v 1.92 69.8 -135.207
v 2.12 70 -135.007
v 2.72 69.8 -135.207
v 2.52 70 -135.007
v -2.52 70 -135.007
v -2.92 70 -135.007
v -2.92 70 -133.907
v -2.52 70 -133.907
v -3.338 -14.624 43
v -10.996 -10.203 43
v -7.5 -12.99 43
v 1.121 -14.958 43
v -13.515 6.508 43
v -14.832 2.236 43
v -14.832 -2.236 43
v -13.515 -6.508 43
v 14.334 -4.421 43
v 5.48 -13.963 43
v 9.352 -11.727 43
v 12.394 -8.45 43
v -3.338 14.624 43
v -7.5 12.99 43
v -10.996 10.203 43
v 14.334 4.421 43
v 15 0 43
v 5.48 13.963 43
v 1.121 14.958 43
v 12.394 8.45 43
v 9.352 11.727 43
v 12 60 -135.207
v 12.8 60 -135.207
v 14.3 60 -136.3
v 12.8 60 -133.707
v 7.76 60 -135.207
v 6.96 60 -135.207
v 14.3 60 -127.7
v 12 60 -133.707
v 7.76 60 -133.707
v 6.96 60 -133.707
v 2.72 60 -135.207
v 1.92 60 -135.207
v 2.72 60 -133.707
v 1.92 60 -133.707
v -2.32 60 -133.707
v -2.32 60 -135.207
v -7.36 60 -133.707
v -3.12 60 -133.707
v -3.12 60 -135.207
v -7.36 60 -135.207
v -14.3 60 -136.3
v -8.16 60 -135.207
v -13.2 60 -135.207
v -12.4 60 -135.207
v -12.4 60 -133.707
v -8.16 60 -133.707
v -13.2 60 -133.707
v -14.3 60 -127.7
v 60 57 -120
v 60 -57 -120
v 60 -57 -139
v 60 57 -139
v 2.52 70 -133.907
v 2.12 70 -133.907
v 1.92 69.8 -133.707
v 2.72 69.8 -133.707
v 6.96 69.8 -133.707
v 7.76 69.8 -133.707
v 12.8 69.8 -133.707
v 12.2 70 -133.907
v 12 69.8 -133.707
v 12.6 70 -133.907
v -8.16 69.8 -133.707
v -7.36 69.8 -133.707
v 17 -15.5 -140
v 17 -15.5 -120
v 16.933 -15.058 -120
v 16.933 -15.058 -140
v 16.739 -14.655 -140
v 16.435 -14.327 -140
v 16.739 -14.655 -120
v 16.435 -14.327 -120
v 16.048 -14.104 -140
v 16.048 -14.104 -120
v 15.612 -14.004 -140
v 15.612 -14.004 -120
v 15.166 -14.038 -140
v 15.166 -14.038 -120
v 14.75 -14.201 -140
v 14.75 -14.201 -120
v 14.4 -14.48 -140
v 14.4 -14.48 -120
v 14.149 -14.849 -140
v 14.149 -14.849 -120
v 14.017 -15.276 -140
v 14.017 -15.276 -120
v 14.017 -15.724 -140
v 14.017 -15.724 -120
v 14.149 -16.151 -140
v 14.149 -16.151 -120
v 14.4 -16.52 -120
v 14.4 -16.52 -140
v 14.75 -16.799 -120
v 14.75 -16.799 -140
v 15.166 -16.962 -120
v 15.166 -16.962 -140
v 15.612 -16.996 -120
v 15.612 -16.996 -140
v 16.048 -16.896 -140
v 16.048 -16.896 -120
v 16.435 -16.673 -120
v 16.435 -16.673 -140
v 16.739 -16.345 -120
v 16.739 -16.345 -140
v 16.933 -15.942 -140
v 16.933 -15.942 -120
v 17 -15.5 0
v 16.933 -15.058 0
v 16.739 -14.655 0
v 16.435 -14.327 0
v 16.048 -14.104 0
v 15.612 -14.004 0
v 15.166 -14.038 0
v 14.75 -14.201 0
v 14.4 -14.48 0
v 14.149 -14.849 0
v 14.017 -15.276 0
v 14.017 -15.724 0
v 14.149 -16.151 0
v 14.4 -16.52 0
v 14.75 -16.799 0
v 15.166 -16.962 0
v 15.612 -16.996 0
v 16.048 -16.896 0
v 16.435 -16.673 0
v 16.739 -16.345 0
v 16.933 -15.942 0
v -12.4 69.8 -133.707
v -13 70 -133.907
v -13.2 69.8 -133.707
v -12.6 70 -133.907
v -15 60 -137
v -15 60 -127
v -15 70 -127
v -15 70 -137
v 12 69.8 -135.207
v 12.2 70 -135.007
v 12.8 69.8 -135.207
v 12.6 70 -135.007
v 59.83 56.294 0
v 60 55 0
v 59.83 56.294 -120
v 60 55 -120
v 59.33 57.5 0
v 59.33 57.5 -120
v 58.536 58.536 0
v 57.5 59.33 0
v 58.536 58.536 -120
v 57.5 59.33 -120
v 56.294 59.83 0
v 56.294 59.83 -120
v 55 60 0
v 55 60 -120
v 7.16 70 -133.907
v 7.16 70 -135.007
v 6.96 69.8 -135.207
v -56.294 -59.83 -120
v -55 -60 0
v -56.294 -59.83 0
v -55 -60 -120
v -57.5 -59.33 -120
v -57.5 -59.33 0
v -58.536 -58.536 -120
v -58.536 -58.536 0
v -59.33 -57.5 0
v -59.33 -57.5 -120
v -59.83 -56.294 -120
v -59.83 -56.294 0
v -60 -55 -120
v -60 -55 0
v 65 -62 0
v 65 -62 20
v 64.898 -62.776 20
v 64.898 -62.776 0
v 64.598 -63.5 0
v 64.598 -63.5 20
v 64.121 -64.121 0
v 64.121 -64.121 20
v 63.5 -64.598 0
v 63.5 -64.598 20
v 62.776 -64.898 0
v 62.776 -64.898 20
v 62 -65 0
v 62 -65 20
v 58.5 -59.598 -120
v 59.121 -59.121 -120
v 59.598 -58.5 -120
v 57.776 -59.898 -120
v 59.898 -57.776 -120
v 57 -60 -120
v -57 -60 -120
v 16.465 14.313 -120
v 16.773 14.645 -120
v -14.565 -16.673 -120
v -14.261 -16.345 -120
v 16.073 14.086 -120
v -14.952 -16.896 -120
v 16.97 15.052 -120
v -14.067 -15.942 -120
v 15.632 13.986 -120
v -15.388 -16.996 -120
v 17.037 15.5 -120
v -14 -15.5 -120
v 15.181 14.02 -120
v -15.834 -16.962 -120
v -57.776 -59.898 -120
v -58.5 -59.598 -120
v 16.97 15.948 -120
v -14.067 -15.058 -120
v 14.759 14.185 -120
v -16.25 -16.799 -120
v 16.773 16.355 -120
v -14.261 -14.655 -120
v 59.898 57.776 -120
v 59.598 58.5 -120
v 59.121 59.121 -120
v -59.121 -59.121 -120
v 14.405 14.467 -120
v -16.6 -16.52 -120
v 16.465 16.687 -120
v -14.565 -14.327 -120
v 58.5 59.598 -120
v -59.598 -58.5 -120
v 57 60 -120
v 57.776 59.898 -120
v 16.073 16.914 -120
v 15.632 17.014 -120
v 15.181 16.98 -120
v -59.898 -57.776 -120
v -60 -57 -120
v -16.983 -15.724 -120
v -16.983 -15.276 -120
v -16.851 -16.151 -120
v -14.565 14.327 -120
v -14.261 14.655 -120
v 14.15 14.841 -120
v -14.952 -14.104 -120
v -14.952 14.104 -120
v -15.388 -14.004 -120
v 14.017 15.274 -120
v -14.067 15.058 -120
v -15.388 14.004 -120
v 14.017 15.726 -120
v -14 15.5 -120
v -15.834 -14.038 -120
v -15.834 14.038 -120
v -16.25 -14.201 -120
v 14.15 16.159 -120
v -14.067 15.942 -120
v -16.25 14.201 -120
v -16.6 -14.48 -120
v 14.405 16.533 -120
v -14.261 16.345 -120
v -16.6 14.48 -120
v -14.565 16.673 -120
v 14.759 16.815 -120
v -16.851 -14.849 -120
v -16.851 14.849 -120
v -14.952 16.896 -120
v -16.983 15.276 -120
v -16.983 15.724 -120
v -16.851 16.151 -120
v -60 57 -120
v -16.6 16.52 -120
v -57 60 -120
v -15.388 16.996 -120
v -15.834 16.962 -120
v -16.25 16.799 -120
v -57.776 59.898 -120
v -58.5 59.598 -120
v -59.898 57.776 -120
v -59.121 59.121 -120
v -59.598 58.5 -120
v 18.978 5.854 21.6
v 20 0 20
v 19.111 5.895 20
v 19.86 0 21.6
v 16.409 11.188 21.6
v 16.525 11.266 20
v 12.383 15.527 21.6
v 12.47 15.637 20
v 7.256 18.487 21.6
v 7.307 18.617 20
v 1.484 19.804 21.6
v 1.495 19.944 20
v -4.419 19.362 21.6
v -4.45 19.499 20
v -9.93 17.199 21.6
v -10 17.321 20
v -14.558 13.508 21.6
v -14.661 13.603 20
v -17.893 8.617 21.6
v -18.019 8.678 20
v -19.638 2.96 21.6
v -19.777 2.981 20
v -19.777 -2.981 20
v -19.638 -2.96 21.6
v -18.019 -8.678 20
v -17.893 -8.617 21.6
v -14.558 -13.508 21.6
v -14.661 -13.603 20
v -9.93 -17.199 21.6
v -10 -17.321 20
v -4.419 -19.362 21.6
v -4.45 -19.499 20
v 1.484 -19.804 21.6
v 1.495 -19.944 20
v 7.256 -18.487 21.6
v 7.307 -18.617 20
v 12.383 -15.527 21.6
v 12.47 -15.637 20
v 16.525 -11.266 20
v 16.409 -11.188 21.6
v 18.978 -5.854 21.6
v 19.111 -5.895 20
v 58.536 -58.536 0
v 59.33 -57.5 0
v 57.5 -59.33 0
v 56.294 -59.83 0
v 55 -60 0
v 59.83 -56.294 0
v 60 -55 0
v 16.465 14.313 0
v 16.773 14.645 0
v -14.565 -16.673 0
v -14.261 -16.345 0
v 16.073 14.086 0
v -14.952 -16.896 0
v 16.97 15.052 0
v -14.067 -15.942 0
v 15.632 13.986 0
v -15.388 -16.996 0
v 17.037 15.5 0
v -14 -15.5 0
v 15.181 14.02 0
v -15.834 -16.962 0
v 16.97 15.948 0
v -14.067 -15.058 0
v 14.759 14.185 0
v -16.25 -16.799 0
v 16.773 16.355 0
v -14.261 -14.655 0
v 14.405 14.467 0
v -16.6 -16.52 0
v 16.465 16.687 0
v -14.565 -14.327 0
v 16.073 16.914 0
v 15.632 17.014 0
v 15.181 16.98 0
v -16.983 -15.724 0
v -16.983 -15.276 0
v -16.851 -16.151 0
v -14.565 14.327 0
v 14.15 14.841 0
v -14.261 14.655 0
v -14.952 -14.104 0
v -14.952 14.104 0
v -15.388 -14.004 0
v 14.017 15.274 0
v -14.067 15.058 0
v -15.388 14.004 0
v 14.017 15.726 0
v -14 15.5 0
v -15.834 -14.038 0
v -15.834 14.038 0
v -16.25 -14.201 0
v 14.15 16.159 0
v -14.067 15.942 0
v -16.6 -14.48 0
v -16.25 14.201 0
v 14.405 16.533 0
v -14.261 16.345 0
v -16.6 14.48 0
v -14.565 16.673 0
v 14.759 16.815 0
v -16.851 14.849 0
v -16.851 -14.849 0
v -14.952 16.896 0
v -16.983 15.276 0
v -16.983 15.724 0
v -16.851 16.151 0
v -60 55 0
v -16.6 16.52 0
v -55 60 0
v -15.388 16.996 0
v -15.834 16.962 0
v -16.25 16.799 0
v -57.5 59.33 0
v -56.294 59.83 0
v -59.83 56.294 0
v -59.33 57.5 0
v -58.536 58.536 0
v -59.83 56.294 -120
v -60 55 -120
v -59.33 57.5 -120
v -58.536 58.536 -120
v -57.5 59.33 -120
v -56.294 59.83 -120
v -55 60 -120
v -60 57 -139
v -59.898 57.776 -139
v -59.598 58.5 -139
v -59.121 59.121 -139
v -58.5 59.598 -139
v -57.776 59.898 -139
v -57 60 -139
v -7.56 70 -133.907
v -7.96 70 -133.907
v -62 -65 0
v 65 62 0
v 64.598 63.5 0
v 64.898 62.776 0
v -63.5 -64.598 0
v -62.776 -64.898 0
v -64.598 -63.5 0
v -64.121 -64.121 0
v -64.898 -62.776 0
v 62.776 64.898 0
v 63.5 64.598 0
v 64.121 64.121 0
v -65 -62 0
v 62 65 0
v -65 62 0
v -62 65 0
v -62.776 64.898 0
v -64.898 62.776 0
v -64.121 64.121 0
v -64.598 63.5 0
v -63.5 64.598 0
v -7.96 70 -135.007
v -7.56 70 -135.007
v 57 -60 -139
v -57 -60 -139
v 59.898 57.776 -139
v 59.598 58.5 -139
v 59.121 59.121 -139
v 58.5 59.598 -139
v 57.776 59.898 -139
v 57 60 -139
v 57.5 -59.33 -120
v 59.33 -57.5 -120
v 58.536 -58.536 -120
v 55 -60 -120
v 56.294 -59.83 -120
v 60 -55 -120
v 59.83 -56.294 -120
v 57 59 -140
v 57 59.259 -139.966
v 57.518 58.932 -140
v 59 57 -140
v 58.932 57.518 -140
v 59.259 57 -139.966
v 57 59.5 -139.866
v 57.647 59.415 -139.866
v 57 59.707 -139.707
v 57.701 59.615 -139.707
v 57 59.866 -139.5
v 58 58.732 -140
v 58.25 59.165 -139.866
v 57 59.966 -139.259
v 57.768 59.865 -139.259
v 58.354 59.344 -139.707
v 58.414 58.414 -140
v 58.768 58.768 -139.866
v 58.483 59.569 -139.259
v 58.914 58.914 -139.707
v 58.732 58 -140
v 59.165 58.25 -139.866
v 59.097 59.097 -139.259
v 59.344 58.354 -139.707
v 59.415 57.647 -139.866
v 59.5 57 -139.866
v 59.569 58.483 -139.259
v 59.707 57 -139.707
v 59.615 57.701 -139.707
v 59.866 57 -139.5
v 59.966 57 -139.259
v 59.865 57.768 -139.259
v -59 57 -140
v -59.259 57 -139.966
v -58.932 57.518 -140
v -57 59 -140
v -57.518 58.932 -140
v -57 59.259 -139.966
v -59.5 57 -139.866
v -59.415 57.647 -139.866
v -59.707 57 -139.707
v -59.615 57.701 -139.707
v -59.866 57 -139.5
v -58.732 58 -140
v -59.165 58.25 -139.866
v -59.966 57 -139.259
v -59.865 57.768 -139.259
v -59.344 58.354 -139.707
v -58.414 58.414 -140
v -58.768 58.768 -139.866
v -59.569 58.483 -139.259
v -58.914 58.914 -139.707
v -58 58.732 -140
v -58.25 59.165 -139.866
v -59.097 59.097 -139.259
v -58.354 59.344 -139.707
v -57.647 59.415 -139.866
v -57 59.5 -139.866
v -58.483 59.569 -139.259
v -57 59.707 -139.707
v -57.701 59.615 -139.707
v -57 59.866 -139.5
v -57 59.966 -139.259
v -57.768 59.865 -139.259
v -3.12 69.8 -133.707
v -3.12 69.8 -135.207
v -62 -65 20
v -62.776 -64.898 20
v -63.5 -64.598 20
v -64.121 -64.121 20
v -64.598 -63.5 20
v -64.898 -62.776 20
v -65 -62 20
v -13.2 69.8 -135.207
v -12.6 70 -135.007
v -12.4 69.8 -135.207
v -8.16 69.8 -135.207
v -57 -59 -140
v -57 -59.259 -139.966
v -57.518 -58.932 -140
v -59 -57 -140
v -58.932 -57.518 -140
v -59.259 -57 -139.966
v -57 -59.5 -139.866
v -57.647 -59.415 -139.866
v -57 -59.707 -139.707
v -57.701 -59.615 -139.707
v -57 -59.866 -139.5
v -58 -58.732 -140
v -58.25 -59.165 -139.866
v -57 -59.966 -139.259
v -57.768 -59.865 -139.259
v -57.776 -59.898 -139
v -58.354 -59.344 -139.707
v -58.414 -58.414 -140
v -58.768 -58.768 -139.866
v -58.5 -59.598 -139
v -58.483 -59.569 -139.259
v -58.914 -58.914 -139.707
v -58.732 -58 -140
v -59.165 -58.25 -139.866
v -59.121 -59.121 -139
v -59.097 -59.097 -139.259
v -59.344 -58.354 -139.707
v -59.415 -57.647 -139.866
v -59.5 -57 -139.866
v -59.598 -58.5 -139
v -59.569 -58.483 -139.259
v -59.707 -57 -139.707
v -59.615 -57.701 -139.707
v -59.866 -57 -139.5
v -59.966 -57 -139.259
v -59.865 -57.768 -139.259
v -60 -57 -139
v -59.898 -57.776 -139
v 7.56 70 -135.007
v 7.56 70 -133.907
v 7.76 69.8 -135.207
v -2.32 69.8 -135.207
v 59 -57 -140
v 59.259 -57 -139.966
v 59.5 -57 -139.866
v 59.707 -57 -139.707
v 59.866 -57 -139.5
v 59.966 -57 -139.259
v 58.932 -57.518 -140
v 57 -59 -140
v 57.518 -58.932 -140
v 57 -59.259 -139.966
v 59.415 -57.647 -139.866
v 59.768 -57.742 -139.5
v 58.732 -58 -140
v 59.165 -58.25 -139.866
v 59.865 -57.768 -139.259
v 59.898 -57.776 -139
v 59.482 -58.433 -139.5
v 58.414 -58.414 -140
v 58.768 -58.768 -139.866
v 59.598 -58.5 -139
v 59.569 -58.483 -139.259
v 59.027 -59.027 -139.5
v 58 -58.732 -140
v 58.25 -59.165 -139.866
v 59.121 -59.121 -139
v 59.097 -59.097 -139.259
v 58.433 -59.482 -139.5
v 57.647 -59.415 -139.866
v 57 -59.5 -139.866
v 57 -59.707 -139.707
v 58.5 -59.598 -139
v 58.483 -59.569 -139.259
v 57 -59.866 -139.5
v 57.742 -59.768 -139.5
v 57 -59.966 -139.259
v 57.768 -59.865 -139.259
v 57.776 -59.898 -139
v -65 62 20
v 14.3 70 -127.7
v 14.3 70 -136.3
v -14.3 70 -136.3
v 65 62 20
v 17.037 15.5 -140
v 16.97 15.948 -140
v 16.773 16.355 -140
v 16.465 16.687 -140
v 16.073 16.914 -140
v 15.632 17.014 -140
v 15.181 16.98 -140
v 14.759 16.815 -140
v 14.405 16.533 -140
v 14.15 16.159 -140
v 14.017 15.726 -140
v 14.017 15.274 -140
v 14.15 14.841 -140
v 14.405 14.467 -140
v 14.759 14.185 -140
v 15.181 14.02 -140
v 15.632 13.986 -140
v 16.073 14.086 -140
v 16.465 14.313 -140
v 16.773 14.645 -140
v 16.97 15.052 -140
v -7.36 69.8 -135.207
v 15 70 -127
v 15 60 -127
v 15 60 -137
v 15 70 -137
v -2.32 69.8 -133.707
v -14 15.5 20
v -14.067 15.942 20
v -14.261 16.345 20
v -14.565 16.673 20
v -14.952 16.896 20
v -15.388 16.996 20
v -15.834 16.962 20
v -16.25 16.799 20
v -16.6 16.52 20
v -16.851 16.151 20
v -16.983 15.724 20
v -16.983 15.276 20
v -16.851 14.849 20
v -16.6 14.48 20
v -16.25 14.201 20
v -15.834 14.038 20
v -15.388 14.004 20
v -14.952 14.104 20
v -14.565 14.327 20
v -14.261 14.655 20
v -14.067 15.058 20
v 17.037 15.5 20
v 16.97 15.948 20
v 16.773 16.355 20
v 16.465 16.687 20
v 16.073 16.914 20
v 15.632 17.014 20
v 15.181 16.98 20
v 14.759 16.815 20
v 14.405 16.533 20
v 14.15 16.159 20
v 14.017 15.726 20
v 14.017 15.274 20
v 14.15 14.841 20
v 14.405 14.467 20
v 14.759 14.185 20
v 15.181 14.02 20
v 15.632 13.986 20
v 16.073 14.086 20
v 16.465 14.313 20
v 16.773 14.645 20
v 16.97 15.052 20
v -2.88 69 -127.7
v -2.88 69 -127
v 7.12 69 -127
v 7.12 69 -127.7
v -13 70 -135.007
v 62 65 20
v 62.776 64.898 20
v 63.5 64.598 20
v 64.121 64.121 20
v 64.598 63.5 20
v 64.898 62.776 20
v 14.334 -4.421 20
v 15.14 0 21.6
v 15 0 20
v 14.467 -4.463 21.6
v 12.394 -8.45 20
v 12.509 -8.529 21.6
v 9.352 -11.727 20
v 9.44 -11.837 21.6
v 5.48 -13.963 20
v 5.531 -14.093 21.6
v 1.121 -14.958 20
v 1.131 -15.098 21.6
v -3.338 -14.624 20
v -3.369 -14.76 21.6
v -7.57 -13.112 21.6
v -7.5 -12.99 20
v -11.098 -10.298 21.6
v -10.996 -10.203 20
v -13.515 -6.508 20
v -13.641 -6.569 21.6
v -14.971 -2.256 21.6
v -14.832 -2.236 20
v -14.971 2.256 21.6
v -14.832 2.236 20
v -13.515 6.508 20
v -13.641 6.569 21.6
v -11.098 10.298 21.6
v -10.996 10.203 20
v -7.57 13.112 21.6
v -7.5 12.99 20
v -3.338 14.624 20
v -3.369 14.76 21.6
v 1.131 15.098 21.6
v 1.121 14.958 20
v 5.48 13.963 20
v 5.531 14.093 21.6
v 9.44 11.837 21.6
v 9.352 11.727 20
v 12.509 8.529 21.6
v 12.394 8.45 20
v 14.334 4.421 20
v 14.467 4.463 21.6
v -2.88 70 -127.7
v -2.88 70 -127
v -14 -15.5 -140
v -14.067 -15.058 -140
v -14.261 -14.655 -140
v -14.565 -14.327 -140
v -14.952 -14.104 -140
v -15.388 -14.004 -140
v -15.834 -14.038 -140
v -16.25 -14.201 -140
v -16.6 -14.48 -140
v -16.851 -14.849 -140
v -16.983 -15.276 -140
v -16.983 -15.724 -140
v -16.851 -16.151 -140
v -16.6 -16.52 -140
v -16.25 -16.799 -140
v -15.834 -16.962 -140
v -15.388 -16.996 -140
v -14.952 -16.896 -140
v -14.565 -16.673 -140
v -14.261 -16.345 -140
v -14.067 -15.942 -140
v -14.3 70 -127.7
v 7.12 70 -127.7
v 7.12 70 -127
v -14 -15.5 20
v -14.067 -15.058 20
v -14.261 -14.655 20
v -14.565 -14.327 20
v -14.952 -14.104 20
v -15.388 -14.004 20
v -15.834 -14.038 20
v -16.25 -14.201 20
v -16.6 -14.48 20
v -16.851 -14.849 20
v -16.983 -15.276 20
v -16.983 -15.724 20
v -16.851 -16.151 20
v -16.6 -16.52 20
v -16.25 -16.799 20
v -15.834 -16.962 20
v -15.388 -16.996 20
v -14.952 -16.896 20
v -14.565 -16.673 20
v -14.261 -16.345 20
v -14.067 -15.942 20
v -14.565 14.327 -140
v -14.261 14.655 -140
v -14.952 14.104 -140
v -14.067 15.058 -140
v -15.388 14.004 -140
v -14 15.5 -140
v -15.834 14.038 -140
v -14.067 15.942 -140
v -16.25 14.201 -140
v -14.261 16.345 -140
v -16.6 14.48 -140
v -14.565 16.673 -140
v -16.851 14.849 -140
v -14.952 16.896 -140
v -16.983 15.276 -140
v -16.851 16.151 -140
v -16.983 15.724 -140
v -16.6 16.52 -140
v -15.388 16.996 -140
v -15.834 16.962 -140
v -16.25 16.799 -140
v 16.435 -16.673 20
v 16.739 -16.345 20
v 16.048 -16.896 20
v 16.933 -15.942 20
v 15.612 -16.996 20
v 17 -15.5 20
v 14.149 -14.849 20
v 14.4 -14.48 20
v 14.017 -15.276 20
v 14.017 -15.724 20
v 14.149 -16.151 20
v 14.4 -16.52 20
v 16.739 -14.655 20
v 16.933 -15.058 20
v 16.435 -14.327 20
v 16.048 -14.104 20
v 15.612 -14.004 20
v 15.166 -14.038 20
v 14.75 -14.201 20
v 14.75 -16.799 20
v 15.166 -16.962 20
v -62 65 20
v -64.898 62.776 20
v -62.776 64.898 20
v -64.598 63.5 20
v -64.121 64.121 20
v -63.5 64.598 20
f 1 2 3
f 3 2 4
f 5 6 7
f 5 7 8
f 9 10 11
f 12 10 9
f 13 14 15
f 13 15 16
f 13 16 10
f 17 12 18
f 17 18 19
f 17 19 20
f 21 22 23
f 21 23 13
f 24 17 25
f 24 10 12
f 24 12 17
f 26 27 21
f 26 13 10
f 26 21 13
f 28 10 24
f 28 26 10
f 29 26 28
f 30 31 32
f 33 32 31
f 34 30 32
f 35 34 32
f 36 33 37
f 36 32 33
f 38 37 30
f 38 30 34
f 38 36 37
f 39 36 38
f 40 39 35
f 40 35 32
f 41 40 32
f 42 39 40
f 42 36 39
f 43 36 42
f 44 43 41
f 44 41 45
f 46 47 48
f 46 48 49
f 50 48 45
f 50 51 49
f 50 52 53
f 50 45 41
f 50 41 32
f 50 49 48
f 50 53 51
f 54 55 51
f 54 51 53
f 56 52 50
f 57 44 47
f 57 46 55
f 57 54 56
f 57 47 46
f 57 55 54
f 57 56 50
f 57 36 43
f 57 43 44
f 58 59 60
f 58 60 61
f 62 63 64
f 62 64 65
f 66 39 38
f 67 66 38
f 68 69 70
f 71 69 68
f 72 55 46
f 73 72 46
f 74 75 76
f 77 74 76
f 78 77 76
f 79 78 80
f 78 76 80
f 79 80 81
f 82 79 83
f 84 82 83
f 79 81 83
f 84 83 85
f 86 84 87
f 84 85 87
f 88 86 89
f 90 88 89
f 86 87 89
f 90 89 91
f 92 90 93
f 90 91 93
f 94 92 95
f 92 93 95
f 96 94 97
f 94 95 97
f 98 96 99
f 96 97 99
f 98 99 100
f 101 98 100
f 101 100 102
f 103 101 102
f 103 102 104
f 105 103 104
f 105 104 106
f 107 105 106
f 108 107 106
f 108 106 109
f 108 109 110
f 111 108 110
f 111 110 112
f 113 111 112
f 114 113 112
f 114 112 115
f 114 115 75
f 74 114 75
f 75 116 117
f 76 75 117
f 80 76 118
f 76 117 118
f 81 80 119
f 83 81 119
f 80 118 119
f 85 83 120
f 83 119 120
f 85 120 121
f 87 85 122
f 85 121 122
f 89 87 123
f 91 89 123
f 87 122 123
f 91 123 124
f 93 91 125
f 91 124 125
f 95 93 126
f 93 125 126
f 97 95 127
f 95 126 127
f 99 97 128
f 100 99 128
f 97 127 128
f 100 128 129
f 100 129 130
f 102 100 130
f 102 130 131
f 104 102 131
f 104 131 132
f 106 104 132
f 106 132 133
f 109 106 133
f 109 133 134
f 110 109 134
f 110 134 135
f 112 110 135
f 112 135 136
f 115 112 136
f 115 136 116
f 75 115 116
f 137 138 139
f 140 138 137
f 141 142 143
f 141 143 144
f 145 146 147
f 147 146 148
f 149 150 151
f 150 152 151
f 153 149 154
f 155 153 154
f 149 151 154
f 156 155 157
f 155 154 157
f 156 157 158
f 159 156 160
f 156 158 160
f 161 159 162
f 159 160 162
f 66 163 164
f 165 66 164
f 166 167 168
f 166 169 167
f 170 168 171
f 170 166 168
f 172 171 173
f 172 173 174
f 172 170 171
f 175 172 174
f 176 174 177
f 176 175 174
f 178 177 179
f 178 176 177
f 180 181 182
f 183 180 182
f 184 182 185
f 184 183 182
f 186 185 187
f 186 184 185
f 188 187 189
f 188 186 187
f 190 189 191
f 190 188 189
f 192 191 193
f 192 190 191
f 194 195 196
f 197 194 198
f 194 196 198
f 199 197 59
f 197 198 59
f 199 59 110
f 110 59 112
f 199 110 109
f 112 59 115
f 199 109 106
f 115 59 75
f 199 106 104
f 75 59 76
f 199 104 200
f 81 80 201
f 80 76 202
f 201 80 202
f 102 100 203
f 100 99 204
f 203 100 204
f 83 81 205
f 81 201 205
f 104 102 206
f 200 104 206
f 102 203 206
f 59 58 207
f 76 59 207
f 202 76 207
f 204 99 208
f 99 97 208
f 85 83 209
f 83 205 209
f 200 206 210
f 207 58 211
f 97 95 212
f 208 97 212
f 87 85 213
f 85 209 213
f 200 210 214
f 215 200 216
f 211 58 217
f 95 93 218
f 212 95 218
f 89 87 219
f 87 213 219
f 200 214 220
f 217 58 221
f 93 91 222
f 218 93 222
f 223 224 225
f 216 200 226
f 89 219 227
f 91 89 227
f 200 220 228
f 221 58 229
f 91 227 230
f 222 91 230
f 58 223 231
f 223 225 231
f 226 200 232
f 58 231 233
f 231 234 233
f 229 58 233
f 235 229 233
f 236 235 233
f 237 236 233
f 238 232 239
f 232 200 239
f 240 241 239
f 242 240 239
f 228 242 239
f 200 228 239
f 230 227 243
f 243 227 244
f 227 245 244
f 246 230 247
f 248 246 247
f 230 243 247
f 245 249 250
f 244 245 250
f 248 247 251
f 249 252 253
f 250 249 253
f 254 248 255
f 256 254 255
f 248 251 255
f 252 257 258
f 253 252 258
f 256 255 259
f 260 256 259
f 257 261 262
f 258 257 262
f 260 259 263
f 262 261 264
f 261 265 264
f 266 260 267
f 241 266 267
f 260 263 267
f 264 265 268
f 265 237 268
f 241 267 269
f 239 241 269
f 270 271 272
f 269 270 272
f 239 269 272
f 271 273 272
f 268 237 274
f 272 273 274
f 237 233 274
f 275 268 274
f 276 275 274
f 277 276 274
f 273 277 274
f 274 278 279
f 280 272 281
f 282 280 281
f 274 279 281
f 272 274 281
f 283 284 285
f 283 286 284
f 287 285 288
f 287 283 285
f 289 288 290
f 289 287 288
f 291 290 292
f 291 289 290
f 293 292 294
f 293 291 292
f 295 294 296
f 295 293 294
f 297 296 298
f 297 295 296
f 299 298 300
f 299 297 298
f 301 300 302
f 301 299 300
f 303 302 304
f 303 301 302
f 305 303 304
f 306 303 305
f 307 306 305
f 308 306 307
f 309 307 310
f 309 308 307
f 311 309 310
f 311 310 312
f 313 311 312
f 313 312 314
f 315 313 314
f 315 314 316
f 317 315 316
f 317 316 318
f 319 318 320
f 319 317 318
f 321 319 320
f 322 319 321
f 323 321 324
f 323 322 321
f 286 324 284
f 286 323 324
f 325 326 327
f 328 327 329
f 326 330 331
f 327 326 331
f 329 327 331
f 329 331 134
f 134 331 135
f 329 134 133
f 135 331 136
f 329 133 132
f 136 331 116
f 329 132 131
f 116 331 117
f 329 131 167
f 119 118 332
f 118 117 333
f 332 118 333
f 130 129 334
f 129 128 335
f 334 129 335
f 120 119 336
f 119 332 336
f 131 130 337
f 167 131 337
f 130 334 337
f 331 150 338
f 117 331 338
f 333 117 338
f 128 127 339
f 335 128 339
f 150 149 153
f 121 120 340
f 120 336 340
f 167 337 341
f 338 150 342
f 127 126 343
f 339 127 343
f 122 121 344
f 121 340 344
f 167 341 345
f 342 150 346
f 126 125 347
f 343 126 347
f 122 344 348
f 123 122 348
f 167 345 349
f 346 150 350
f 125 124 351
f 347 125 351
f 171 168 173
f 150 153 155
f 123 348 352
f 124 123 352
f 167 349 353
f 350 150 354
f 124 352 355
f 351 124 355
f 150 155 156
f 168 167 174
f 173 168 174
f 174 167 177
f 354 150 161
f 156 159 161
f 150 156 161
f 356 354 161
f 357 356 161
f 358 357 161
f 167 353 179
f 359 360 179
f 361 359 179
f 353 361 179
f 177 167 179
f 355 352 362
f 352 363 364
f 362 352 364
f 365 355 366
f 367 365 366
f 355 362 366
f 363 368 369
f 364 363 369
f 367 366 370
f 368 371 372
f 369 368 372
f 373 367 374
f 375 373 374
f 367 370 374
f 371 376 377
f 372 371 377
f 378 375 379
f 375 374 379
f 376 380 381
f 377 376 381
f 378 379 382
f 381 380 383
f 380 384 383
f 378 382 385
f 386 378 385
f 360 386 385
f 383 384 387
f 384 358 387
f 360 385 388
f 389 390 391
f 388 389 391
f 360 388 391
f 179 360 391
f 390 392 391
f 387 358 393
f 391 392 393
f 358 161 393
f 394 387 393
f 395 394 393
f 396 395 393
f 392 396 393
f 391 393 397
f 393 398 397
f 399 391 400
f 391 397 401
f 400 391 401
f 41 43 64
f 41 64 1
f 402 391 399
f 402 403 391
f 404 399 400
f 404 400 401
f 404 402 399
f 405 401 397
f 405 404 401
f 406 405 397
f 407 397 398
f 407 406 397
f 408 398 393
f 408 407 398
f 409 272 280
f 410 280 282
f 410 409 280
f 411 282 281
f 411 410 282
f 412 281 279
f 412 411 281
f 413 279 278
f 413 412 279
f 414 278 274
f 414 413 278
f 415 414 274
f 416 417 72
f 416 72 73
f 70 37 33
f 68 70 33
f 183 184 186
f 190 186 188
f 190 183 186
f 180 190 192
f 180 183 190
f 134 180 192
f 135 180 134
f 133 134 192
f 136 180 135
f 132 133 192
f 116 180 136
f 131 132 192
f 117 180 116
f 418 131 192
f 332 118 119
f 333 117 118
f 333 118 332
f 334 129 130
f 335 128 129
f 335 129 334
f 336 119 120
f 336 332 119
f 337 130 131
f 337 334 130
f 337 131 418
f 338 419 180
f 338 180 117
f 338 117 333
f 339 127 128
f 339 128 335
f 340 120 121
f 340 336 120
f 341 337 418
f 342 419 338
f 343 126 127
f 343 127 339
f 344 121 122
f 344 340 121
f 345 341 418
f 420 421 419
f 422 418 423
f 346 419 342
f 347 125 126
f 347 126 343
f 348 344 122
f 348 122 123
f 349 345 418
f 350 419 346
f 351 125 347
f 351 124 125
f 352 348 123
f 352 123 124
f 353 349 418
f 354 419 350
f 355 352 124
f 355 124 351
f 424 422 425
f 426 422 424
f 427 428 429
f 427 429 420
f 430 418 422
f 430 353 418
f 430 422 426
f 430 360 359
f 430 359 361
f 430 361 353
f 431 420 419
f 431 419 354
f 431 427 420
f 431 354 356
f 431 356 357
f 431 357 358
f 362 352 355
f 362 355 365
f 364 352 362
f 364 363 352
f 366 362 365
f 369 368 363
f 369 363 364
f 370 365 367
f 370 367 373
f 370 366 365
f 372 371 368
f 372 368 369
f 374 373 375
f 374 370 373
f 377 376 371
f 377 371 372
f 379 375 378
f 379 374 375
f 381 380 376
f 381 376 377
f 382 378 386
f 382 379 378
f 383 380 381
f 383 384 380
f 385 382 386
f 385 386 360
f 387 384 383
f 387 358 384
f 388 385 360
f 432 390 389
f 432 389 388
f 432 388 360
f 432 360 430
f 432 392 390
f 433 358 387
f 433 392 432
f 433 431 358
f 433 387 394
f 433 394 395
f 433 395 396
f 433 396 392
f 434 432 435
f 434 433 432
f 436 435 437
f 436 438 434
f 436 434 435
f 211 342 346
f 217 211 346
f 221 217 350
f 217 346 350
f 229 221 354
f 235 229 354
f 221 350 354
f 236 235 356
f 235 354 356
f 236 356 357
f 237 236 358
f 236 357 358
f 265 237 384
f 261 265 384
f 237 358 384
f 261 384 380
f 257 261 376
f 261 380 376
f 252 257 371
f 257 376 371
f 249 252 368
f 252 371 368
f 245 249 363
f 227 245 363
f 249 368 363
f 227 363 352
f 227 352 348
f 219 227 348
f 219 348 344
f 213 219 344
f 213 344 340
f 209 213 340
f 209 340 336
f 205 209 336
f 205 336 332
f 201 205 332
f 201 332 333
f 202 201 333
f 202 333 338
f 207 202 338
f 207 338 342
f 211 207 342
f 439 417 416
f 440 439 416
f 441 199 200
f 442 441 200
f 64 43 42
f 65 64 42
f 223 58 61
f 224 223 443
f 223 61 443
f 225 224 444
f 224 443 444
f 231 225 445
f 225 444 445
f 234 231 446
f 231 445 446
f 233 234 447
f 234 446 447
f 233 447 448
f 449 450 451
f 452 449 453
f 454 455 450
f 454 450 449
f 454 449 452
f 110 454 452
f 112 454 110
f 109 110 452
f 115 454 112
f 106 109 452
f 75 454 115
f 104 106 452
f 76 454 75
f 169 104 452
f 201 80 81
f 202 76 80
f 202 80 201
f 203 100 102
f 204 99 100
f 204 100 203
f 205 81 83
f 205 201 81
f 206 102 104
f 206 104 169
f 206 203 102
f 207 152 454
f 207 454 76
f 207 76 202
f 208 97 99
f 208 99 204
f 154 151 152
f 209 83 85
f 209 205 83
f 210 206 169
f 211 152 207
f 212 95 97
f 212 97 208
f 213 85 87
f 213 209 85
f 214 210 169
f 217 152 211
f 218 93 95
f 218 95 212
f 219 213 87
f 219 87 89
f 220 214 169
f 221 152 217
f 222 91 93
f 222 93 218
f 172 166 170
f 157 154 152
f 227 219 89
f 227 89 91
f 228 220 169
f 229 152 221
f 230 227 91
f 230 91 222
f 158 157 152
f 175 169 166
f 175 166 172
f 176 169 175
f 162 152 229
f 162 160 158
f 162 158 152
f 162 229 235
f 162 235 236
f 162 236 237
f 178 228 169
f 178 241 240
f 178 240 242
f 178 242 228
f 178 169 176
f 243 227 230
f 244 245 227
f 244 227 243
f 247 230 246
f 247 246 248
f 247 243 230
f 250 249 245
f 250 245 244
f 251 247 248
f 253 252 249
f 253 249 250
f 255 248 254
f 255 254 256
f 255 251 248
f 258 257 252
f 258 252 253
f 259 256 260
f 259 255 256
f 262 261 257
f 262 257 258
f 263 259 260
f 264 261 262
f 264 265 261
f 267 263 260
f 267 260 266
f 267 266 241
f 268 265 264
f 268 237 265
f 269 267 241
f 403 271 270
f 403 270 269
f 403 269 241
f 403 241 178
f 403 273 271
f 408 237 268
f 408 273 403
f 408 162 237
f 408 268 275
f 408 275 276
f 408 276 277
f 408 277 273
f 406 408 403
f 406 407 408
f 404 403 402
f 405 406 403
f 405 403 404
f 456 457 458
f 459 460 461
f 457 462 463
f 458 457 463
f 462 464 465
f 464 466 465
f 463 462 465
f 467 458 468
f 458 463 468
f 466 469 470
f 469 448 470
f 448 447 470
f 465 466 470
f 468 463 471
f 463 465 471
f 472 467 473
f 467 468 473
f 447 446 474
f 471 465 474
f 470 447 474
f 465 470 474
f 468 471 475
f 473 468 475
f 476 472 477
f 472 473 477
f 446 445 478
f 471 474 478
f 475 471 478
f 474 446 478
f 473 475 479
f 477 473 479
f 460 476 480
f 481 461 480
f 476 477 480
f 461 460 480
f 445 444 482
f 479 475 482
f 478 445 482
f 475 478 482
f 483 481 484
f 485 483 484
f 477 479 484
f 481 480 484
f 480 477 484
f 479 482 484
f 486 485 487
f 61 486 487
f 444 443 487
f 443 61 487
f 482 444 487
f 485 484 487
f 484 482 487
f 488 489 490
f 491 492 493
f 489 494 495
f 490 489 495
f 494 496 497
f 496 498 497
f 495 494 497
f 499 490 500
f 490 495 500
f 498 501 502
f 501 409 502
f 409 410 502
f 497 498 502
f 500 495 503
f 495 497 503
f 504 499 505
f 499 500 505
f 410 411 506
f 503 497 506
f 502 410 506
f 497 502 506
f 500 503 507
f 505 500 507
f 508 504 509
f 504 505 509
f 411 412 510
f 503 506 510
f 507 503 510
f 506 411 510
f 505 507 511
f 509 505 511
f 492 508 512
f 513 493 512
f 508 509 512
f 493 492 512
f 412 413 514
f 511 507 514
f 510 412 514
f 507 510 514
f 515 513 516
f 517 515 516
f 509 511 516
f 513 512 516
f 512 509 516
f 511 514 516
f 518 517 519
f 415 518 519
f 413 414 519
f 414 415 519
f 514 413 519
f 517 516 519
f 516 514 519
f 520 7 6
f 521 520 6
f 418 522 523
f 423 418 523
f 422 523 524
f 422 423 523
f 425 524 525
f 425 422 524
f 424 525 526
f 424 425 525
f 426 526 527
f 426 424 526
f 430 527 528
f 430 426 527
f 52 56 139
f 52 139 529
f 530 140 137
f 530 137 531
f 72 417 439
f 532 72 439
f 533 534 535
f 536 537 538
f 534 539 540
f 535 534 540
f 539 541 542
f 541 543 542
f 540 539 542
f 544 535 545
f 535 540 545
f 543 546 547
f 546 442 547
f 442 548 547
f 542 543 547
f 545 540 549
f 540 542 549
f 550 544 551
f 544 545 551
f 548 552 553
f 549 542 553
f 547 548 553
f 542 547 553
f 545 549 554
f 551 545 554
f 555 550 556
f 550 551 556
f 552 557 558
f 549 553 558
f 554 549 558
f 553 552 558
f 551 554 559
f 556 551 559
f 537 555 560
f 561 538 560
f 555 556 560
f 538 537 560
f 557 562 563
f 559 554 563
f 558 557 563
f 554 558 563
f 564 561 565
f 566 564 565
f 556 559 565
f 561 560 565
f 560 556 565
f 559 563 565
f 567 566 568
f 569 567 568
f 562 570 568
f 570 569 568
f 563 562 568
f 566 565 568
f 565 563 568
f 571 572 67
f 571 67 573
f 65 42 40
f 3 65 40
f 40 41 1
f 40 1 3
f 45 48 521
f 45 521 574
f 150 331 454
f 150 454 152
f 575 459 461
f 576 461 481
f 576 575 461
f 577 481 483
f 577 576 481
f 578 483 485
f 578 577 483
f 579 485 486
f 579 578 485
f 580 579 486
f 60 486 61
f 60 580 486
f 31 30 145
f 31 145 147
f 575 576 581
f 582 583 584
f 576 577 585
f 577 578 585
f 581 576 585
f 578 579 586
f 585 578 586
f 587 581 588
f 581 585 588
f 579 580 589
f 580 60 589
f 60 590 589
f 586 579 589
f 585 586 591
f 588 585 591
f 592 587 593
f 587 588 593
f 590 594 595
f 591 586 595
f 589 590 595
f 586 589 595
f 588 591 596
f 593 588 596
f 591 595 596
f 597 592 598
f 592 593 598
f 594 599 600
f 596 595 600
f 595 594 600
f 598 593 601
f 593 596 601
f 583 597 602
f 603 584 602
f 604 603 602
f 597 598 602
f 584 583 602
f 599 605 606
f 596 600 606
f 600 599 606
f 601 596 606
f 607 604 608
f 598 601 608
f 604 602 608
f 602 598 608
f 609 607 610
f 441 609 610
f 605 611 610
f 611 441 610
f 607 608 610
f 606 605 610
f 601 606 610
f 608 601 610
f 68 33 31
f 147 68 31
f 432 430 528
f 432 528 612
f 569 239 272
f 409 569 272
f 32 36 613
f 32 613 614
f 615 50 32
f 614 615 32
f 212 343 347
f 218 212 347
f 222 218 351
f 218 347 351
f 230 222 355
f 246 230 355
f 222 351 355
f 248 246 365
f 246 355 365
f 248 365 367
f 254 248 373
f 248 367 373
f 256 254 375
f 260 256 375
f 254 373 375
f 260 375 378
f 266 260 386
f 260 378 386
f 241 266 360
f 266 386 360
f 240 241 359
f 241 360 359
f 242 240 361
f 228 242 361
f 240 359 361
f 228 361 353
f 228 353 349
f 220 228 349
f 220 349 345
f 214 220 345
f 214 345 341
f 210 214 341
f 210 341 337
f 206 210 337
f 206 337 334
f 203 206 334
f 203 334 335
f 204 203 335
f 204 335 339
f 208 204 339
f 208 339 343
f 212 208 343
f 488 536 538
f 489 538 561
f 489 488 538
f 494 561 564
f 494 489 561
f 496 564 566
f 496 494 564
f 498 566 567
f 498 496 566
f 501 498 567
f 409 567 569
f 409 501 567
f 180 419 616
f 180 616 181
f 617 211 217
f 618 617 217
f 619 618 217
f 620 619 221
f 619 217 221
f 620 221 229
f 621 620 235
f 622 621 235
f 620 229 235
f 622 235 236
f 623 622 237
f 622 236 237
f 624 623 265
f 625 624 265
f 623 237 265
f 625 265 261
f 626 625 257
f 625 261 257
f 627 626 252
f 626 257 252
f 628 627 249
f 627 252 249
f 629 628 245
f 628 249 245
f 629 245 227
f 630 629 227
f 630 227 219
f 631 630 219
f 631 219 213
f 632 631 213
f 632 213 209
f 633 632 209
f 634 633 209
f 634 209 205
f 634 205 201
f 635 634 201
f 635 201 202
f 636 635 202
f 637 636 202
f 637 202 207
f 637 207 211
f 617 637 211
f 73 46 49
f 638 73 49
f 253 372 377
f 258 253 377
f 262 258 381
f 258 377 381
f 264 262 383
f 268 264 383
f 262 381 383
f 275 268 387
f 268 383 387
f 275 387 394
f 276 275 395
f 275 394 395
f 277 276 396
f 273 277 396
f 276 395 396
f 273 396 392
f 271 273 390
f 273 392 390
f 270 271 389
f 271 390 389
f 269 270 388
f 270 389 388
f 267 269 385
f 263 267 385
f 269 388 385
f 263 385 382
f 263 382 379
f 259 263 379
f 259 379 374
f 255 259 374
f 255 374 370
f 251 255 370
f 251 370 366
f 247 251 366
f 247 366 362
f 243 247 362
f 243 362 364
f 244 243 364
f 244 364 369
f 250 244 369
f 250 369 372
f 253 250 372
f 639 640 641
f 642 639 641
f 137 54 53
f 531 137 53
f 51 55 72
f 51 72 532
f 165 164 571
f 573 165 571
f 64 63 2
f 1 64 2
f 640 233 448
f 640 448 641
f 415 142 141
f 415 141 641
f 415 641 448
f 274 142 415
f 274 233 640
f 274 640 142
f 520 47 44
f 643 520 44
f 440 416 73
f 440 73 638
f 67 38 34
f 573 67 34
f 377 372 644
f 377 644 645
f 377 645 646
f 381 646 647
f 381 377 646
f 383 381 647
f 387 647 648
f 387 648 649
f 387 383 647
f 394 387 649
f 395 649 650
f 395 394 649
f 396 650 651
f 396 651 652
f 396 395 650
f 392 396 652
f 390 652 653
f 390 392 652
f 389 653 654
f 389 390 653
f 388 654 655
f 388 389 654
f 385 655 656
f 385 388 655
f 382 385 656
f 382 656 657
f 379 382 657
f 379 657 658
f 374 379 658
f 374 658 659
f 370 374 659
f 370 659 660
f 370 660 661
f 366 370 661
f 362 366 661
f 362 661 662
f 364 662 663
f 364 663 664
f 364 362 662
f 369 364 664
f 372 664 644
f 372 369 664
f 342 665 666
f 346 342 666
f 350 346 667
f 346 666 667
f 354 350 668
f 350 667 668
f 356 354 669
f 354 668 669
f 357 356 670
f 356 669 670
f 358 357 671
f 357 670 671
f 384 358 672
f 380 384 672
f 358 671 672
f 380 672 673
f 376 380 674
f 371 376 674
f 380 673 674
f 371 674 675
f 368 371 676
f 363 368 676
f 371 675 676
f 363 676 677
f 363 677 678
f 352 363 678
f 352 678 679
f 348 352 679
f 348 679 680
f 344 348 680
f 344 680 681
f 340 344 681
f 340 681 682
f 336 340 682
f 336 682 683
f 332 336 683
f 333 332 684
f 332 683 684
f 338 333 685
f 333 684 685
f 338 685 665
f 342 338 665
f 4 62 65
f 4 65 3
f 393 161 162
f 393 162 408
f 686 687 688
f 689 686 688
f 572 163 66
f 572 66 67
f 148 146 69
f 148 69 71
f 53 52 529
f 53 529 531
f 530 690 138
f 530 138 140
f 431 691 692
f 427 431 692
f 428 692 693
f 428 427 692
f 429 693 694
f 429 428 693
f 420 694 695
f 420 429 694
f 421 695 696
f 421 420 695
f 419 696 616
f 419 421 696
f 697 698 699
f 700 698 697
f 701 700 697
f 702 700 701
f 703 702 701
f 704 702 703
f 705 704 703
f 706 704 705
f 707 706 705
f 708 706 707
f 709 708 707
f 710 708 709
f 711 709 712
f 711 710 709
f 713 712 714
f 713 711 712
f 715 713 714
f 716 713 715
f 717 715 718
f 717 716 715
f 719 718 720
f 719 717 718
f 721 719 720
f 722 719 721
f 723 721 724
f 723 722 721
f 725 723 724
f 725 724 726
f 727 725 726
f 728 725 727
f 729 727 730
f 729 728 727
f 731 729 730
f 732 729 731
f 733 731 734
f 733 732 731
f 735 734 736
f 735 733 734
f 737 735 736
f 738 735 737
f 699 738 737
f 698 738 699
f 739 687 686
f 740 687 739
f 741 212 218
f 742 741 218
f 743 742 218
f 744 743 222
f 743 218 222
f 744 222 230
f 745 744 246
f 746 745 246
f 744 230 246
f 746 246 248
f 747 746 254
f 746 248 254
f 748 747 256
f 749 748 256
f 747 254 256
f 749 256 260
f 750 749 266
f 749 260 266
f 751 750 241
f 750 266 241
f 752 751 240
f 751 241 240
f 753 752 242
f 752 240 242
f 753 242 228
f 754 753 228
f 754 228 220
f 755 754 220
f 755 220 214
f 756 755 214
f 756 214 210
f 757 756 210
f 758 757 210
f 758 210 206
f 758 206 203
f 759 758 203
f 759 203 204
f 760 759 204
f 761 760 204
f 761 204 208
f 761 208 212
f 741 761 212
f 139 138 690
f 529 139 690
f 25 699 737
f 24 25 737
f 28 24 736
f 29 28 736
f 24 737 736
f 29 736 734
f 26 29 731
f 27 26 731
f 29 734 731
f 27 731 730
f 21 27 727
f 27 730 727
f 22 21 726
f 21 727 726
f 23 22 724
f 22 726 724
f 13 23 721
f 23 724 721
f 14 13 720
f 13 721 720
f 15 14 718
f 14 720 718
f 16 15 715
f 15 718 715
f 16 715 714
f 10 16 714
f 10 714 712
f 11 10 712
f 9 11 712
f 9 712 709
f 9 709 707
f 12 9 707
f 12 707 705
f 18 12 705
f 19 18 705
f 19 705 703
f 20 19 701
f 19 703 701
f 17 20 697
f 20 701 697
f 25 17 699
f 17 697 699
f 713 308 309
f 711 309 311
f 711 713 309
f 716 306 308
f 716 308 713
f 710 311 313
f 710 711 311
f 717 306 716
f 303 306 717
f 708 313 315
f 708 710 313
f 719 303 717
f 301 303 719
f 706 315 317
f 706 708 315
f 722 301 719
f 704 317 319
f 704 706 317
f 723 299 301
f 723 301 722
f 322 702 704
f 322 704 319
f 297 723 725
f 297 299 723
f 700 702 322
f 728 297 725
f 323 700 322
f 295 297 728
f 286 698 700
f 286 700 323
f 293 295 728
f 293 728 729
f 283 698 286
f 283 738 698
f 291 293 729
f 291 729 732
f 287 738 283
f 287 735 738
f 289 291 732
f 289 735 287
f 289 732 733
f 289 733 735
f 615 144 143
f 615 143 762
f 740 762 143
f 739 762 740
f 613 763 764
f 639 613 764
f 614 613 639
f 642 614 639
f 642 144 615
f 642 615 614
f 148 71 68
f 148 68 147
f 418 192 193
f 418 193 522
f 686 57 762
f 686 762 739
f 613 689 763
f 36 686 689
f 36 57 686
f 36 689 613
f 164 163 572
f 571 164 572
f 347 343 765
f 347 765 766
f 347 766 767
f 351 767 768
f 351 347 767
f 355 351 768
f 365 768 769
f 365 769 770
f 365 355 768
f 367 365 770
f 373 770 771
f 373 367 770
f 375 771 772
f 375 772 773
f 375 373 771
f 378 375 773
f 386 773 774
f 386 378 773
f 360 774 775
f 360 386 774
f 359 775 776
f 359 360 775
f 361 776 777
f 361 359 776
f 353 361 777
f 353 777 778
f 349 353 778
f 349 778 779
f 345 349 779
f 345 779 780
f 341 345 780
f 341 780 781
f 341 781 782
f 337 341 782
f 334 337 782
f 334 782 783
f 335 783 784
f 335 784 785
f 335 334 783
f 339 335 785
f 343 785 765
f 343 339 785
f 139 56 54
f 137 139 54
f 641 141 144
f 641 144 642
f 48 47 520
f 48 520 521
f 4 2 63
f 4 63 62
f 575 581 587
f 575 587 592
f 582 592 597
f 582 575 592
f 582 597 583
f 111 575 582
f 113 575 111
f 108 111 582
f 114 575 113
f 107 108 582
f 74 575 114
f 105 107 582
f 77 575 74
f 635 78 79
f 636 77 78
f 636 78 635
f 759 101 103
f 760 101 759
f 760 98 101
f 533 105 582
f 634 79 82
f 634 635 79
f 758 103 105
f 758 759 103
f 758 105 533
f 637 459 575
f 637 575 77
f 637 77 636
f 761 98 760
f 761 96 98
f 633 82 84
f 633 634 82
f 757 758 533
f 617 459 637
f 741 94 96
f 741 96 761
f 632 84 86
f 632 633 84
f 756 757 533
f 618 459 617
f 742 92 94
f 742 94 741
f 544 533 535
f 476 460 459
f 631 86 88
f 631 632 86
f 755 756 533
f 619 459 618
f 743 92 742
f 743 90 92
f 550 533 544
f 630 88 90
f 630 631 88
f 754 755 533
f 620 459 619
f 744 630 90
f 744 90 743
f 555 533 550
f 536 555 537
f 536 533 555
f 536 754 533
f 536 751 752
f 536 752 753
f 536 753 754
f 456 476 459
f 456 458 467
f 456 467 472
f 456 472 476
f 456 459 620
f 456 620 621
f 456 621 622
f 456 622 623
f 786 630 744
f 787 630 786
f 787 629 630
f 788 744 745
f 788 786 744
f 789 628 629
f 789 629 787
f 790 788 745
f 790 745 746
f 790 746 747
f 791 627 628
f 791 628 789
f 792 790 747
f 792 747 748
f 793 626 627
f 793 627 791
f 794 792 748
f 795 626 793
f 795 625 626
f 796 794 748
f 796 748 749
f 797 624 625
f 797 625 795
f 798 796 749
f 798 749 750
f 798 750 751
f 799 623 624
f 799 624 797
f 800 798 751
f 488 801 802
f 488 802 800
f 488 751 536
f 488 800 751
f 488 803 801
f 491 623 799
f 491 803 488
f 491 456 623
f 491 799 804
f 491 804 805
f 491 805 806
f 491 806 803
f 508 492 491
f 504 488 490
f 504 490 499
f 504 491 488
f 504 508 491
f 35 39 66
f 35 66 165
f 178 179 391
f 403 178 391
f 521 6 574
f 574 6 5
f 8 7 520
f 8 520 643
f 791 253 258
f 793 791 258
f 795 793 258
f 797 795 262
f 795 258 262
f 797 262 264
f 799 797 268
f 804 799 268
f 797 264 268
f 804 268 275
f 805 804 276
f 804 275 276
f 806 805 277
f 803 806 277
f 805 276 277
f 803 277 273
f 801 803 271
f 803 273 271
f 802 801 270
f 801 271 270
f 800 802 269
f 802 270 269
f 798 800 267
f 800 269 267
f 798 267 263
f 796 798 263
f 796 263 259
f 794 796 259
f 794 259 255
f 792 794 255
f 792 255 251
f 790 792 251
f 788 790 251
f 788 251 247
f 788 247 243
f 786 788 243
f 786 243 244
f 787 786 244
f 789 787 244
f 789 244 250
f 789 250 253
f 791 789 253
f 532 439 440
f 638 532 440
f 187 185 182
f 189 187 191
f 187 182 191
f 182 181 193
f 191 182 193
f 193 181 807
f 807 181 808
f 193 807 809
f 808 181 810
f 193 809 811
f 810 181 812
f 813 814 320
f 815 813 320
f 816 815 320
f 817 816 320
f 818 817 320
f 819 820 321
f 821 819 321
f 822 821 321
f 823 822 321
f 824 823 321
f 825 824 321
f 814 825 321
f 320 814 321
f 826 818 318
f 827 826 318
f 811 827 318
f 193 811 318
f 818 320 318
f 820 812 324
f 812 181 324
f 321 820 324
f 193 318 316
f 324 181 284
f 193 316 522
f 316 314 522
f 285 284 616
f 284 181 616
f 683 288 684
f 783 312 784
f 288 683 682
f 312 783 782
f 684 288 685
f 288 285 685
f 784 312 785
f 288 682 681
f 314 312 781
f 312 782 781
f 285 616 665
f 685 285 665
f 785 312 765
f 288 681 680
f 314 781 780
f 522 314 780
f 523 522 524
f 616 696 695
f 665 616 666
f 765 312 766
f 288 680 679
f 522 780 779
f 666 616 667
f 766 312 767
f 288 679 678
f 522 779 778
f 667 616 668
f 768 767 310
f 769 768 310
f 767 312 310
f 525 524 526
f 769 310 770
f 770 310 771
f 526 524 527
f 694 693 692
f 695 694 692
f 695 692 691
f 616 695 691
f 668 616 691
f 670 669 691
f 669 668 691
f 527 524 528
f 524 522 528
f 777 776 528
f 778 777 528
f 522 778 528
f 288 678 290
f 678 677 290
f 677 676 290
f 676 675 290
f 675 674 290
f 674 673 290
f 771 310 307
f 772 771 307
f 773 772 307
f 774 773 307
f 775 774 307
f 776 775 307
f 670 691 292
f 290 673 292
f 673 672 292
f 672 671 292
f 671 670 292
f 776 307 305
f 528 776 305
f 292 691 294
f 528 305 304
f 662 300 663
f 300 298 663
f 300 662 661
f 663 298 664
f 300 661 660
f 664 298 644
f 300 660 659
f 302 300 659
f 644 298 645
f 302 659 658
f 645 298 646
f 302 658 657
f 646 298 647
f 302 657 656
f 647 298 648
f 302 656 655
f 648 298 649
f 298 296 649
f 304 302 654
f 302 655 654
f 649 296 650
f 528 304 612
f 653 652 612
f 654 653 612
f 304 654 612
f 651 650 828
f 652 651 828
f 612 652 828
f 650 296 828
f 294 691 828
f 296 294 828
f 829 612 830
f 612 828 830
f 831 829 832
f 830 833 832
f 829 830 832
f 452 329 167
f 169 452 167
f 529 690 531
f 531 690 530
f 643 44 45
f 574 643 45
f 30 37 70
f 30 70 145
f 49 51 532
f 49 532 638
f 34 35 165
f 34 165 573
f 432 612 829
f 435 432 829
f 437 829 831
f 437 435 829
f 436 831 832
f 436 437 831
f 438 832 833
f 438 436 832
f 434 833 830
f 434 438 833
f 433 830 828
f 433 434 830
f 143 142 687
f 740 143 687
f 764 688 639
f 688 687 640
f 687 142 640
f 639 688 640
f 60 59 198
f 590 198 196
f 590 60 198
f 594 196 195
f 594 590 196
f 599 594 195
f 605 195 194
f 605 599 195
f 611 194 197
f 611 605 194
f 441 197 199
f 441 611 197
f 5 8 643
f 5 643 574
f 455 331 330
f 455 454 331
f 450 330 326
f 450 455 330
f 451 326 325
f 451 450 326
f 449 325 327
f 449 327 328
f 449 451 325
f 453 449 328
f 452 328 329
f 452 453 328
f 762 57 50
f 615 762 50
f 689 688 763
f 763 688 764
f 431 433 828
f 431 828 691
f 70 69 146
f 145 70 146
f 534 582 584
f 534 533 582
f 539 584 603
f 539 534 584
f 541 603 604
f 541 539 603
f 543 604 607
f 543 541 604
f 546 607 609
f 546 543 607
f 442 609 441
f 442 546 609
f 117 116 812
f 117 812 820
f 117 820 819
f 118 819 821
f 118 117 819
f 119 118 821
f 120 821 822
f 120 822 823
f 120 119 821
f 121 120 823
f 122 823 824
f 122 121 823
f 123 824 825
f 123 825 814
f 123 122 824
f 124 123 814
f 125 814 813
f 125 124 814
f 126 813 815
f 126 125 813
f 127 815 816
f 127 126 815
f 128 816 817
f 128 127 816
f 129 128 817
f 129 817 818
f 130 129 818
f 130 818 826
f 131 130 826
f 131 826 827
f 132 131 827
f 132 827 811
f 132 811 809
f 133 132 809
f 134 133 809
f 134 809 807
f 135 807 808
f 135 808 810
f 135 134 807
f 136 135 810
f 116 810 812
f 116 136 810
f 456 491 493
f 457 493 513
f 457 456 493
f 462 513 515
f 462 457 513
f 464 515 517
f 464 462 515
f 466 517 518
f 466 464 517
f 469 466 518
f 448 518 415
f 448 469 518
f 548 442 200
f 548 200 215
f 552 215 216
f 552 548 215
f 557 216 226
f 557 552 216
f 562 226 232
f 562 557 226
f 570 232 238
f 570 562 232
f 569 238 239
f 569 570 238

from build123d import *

# Parameters (mm, degrees)
SKETCH_1_R          = 1.5
EXTRUDE_1_DEPTH     = 20
SKETCH_4_R          = 15
EXTRUDE_2_DEPTH     = 23
SKETCH_9_W          = 120
SKETCH_9_H          = 120
EXTRUDE_7_DEPTH     = 120
SKETCH_10_W         = 120
SKETCH_10_H         = 120
EXTRUDE_8_DEPTH     = 20
FILLET_1_R          = 3
FILLET_2_R          = 5
SKETCH_12_R         = 1.5
SKETCH_12_R_2       = 1.518540069
CUT_EXTRUDE_1_DEPTH = 161
SKETCH_14_W         = 30
SKETCH_14_H         = 10
SKETCH_14_W_2       = 28.6
SKETCH_14_H_2       = 8.6
SKETCH_14_W_3       = 0.8
SKETCH_14_H_3       = 1.5
EXTRUDE_10_DEPTH    = 10
CHAMFER_1_SIZE      = 0.2
SKETCH_15_W         = 10
SKETCH_15_H         = 1
CUT_EXTRUDE_2_DEPTH = 0.7
FILLET_3_R          = 1
SKETCH_16_R         = 20
SKETCH_16_R_2       = 15
EXTRUDE_11_DEPTH    = 1.6
EXTRUDE_11_TAPER    = 5


with BuildPart() as part:
    # 草图1 → 凸台-拉伸1 (new body)
    with BuildSketch(Plane.XY):
        with BuildLine():
            Line((-62, 65), (62, 65))
            ThreePointArc((62, 65), (64.121320344, 64.121320344), (65, 62))
            Line((65, 62), (65, -62))
            ThreePointArc((65, -62), (64.121320344, -64.121320344), (62, -65))
            Line((62, -65), (-62, -65))
            ThreePointArc((-62, -65), (-64.121320344, -64.121320344), (-65, -62))
            Line((-65, -62), (-65, 62))
            ThreePointArc((-65, 62), (-64.121320344, 64.121320344), (-62, 65))
        make_face()
        with Locations((-15.5, 15.5)):
            Circle(SKETCH_1_R, mode=Mode.SUBTRACT)
        with Locations((15.5, 15.5)):
            Circle(SKETCH_1_R, mode=Mode.SUBTRACT)
        with Locations((15.5, -15.5)):
            Circle(SKETCH_1_R, mode=Mode.SUBTRACT)
        with Locations((-15.5, -15.5)):
            Circle(SKETCH_1_R, mode=Mode.SUBTRACT)
    extrude(amount=EXTRUDE_1_DEPTH)

    # 草图4 → 凸台-拉伸2 (add)
    with BuildSketch(Plane.XY.offset(20)):
        Circle(SKETCH_4_R)
    extrude(amount=EXTRUDE_2_DEPTH)


with BuildPart() as body_2:
    # 草图9 → 凸台-拉伸7 (new body)
    with BuildSketch(Plane(origin=(0, 0, 0), x_dir=(-1, 0, 0), z_dir=(0, 0, -1))):
        Rectangle(SKETCH_9_W, SKETCH_9_H)
    extrude(amount=EXTRUDE_7_DEPTH)

    # 圆角2
    fillet_2_edges = [body_2.edges().sort_by_distance(p)[0] for p in [
        (-60, -60, -60),
        (60, -60, -60),
        (60, 60, -60),
        (-60, 60, -60),
    ]]
    fillet(fillet_2_edges, radius=FILLET_2_R)


with BuildPart() as body_3:
    # 草图10 → 凸台-拉伸8 (new body)
    with BuildSketch(Plane(origin=(0, 0, -120), x_dir=(-1, 0, 0), z_dir=(0, 0, -1))):
        Rectangle(SKETCH_10_W, SKETCH_10_H)
    extrude(amount=EXTRUDE_8_DEPTH)

    # 圆角1
    fillet_1_edges = [body_3.edges().sort_by_distance(p)[0] for p in [
        (60, 60, -130),
        (-60, 60, -130),
        (-60, -60, -130),
        (60, -60, -130),
    ]]
    fillet(fillet_1_edges, radius=FILLET_1_R)


with BuildPart() as cut_extrude_1_tool:
    # 草图12 → 切除-拉伸1 (new body, through all)
    with BuildSketch(Plane.XY.offset(20)):
        with Locations((-15.5, 15.5)):
            Circle(SKETCH_12_R)
        with Locations((15.518540069, 15.5)):
            Circle(SKETCH_12_R_2)
        with Locations((-15.5, -15.5)):
            Circle(SKETCH_12_R)
        with Locations((15.5, -15.5)):
            Circle(SKETCH_12_R)
    extrude(amount=-CUT_EXTRUDE_1_DEPTH)


with BuildPart() as part_1:
    add(part.part)

    # 切除-拉伸1: cut by cut_extrude_1_tool
    add(cut_extrude_1_tool.part, mode=Mode.SUBTRACT)

    # 草图16 → 凸台-拉伸11 (add)
    with BuildSketch(Plane.XY.offset(20)):
        Circle(SKETCH_16_R)
        Circle(SKETCH_16_R_2, mode=Mode.SUBTRACT)
    extrude(amount=EXTRUDE_11_DEPTH, taper=EXTRUDE_11_TAPER)


with BuildPart() as body_2_1:
    add(body_2.part)

    # 切除-拉伸1: cut by cut_extrude_1_tool
    add(cut_extrude_1_tool.part, mode=Mode.SUBTRACT)


with BuildPart() as body_3_1:
    add(body_3.part)

    # 切除-拉伸1: cut by cut_extrude_1_tool
    add(cut_extrude_1_tool.part, mode=Mode.SUBTRACT)

    # 草图14 → 凸台-拉伸10 (add)
    with BuildSketch(Plane(origin=(0, 60, 0), x_dir=(1, 0, 0), z_dir=(0, 1, 0))):
        with Locations((0, 132)):
            Rectangle(SKETCH_14_W, SKETCH_14_H)
        with Locations((0, 132)):
            Rectangle(SKETCH_14_W_2, SKETCH_14_H_2, mode=Mode.SUBTRACT)
        with Locations((-12.8, 134.457329348)):
            Rectangle(SKETCH_14_W_3, SKETCH_14_H_3)
        with Locations((-2.72, 134.457329348)):
            Rectangle(SKETCH_14_W_3, SKETCH_14_H_3)
        with Locations((12.4, 134.457329348)):
            Rectangle(SKETCH_14_W_3, SKETCH_14_H_3)
        with Locations((7.36, 134.457329348)):
            Rectangle(SKETCH_14_W_3, SKETCH_14_H_3)
        with Locations((-7.76, 134.457329348)):
            Rectangle(SKETCH_14_W_3, SKETCH_14_H_3)
        with Locations((2.32, 134.457329348)):
            Rectangle(SKETCH_14_W_3, SKETCH_14_H_3)
    extrude(amount=EXTRUDE_10_DEPTH)

    # 倒角1
    chamfer_1_edges = [body_3_1.edges().sort_by_distance(p)[0] for p in [
        (12.8, 70, -134.457329348),
        (12.4, 70, -135.207329348),
        (12, 70, -134.457329348),
        (12.4, 70, -133.707329348),
        (7.76, 70, -134.457329348),
        (7.36, 70, -135.207329348),
        (6.96, 70, -134.457329348),
        (7.36, 70, -133.707329348),
        (-7.36, 70, -134.457329348),
        (-7.76, 70, -135.207329348),
        (-8.16, 70, -134.457329348),
        (-7.76, 70, -133.707329348),
        (2.72, 70, -134.457329348),
        (2.32, 70, -135.207329348),
        (1.92, 70, -134.457329348),
        (2.32, 70, -133.707329348),
        (-12.4, 70, -134.457329348),
        (-12.8, 70, -135.207329348),
        (-13.2, 70, -134.457329348),
        (-12.8, 70, -133.707329348),
        (-2.32, 70, -134.457329348),
        (-2.72, 70, -135.207329348),
        (-3.12, 70, -134.457329348),
        (-2.72, 70, -133.707329348),
    ]]
    chamfer(chamfer_1_edges, length=CHAMFER_1_SIZE)

    # 草图15 → 切除-拉伸2 (cut)
    with BuildSketch(Plane.XY.offset(-127)):
        with Locations((2.12, 69.5)):
            Rectangle(SKETCH_15_W, SKETCH_15_H)
    extrude(amount=-CUT_EXTRUDE_2_DEPTH, mode=Mode.SUBTRACT)

    # 圆角3
    fillet_3_edges = [body_3_1.edges().sort_by_distance(p)[0] for p in [
        (0, -60, -140),
        (60, 0, -140),
        (-60, 0, -140),
        (0, 60, -140),
        (59.121320344, 59.121320344, -140),
        (-59.121320344, 59.121320344, -140),
        (-59.121320344, -59.121320344, -140),
        (59.121320344, -59.121320344, -140),
    ]]
    fillet(fillet_3_edges, radius=FILLET_3_R)


solid = Compound([part_1.part, body_2_1.part, body_3_1.part])
